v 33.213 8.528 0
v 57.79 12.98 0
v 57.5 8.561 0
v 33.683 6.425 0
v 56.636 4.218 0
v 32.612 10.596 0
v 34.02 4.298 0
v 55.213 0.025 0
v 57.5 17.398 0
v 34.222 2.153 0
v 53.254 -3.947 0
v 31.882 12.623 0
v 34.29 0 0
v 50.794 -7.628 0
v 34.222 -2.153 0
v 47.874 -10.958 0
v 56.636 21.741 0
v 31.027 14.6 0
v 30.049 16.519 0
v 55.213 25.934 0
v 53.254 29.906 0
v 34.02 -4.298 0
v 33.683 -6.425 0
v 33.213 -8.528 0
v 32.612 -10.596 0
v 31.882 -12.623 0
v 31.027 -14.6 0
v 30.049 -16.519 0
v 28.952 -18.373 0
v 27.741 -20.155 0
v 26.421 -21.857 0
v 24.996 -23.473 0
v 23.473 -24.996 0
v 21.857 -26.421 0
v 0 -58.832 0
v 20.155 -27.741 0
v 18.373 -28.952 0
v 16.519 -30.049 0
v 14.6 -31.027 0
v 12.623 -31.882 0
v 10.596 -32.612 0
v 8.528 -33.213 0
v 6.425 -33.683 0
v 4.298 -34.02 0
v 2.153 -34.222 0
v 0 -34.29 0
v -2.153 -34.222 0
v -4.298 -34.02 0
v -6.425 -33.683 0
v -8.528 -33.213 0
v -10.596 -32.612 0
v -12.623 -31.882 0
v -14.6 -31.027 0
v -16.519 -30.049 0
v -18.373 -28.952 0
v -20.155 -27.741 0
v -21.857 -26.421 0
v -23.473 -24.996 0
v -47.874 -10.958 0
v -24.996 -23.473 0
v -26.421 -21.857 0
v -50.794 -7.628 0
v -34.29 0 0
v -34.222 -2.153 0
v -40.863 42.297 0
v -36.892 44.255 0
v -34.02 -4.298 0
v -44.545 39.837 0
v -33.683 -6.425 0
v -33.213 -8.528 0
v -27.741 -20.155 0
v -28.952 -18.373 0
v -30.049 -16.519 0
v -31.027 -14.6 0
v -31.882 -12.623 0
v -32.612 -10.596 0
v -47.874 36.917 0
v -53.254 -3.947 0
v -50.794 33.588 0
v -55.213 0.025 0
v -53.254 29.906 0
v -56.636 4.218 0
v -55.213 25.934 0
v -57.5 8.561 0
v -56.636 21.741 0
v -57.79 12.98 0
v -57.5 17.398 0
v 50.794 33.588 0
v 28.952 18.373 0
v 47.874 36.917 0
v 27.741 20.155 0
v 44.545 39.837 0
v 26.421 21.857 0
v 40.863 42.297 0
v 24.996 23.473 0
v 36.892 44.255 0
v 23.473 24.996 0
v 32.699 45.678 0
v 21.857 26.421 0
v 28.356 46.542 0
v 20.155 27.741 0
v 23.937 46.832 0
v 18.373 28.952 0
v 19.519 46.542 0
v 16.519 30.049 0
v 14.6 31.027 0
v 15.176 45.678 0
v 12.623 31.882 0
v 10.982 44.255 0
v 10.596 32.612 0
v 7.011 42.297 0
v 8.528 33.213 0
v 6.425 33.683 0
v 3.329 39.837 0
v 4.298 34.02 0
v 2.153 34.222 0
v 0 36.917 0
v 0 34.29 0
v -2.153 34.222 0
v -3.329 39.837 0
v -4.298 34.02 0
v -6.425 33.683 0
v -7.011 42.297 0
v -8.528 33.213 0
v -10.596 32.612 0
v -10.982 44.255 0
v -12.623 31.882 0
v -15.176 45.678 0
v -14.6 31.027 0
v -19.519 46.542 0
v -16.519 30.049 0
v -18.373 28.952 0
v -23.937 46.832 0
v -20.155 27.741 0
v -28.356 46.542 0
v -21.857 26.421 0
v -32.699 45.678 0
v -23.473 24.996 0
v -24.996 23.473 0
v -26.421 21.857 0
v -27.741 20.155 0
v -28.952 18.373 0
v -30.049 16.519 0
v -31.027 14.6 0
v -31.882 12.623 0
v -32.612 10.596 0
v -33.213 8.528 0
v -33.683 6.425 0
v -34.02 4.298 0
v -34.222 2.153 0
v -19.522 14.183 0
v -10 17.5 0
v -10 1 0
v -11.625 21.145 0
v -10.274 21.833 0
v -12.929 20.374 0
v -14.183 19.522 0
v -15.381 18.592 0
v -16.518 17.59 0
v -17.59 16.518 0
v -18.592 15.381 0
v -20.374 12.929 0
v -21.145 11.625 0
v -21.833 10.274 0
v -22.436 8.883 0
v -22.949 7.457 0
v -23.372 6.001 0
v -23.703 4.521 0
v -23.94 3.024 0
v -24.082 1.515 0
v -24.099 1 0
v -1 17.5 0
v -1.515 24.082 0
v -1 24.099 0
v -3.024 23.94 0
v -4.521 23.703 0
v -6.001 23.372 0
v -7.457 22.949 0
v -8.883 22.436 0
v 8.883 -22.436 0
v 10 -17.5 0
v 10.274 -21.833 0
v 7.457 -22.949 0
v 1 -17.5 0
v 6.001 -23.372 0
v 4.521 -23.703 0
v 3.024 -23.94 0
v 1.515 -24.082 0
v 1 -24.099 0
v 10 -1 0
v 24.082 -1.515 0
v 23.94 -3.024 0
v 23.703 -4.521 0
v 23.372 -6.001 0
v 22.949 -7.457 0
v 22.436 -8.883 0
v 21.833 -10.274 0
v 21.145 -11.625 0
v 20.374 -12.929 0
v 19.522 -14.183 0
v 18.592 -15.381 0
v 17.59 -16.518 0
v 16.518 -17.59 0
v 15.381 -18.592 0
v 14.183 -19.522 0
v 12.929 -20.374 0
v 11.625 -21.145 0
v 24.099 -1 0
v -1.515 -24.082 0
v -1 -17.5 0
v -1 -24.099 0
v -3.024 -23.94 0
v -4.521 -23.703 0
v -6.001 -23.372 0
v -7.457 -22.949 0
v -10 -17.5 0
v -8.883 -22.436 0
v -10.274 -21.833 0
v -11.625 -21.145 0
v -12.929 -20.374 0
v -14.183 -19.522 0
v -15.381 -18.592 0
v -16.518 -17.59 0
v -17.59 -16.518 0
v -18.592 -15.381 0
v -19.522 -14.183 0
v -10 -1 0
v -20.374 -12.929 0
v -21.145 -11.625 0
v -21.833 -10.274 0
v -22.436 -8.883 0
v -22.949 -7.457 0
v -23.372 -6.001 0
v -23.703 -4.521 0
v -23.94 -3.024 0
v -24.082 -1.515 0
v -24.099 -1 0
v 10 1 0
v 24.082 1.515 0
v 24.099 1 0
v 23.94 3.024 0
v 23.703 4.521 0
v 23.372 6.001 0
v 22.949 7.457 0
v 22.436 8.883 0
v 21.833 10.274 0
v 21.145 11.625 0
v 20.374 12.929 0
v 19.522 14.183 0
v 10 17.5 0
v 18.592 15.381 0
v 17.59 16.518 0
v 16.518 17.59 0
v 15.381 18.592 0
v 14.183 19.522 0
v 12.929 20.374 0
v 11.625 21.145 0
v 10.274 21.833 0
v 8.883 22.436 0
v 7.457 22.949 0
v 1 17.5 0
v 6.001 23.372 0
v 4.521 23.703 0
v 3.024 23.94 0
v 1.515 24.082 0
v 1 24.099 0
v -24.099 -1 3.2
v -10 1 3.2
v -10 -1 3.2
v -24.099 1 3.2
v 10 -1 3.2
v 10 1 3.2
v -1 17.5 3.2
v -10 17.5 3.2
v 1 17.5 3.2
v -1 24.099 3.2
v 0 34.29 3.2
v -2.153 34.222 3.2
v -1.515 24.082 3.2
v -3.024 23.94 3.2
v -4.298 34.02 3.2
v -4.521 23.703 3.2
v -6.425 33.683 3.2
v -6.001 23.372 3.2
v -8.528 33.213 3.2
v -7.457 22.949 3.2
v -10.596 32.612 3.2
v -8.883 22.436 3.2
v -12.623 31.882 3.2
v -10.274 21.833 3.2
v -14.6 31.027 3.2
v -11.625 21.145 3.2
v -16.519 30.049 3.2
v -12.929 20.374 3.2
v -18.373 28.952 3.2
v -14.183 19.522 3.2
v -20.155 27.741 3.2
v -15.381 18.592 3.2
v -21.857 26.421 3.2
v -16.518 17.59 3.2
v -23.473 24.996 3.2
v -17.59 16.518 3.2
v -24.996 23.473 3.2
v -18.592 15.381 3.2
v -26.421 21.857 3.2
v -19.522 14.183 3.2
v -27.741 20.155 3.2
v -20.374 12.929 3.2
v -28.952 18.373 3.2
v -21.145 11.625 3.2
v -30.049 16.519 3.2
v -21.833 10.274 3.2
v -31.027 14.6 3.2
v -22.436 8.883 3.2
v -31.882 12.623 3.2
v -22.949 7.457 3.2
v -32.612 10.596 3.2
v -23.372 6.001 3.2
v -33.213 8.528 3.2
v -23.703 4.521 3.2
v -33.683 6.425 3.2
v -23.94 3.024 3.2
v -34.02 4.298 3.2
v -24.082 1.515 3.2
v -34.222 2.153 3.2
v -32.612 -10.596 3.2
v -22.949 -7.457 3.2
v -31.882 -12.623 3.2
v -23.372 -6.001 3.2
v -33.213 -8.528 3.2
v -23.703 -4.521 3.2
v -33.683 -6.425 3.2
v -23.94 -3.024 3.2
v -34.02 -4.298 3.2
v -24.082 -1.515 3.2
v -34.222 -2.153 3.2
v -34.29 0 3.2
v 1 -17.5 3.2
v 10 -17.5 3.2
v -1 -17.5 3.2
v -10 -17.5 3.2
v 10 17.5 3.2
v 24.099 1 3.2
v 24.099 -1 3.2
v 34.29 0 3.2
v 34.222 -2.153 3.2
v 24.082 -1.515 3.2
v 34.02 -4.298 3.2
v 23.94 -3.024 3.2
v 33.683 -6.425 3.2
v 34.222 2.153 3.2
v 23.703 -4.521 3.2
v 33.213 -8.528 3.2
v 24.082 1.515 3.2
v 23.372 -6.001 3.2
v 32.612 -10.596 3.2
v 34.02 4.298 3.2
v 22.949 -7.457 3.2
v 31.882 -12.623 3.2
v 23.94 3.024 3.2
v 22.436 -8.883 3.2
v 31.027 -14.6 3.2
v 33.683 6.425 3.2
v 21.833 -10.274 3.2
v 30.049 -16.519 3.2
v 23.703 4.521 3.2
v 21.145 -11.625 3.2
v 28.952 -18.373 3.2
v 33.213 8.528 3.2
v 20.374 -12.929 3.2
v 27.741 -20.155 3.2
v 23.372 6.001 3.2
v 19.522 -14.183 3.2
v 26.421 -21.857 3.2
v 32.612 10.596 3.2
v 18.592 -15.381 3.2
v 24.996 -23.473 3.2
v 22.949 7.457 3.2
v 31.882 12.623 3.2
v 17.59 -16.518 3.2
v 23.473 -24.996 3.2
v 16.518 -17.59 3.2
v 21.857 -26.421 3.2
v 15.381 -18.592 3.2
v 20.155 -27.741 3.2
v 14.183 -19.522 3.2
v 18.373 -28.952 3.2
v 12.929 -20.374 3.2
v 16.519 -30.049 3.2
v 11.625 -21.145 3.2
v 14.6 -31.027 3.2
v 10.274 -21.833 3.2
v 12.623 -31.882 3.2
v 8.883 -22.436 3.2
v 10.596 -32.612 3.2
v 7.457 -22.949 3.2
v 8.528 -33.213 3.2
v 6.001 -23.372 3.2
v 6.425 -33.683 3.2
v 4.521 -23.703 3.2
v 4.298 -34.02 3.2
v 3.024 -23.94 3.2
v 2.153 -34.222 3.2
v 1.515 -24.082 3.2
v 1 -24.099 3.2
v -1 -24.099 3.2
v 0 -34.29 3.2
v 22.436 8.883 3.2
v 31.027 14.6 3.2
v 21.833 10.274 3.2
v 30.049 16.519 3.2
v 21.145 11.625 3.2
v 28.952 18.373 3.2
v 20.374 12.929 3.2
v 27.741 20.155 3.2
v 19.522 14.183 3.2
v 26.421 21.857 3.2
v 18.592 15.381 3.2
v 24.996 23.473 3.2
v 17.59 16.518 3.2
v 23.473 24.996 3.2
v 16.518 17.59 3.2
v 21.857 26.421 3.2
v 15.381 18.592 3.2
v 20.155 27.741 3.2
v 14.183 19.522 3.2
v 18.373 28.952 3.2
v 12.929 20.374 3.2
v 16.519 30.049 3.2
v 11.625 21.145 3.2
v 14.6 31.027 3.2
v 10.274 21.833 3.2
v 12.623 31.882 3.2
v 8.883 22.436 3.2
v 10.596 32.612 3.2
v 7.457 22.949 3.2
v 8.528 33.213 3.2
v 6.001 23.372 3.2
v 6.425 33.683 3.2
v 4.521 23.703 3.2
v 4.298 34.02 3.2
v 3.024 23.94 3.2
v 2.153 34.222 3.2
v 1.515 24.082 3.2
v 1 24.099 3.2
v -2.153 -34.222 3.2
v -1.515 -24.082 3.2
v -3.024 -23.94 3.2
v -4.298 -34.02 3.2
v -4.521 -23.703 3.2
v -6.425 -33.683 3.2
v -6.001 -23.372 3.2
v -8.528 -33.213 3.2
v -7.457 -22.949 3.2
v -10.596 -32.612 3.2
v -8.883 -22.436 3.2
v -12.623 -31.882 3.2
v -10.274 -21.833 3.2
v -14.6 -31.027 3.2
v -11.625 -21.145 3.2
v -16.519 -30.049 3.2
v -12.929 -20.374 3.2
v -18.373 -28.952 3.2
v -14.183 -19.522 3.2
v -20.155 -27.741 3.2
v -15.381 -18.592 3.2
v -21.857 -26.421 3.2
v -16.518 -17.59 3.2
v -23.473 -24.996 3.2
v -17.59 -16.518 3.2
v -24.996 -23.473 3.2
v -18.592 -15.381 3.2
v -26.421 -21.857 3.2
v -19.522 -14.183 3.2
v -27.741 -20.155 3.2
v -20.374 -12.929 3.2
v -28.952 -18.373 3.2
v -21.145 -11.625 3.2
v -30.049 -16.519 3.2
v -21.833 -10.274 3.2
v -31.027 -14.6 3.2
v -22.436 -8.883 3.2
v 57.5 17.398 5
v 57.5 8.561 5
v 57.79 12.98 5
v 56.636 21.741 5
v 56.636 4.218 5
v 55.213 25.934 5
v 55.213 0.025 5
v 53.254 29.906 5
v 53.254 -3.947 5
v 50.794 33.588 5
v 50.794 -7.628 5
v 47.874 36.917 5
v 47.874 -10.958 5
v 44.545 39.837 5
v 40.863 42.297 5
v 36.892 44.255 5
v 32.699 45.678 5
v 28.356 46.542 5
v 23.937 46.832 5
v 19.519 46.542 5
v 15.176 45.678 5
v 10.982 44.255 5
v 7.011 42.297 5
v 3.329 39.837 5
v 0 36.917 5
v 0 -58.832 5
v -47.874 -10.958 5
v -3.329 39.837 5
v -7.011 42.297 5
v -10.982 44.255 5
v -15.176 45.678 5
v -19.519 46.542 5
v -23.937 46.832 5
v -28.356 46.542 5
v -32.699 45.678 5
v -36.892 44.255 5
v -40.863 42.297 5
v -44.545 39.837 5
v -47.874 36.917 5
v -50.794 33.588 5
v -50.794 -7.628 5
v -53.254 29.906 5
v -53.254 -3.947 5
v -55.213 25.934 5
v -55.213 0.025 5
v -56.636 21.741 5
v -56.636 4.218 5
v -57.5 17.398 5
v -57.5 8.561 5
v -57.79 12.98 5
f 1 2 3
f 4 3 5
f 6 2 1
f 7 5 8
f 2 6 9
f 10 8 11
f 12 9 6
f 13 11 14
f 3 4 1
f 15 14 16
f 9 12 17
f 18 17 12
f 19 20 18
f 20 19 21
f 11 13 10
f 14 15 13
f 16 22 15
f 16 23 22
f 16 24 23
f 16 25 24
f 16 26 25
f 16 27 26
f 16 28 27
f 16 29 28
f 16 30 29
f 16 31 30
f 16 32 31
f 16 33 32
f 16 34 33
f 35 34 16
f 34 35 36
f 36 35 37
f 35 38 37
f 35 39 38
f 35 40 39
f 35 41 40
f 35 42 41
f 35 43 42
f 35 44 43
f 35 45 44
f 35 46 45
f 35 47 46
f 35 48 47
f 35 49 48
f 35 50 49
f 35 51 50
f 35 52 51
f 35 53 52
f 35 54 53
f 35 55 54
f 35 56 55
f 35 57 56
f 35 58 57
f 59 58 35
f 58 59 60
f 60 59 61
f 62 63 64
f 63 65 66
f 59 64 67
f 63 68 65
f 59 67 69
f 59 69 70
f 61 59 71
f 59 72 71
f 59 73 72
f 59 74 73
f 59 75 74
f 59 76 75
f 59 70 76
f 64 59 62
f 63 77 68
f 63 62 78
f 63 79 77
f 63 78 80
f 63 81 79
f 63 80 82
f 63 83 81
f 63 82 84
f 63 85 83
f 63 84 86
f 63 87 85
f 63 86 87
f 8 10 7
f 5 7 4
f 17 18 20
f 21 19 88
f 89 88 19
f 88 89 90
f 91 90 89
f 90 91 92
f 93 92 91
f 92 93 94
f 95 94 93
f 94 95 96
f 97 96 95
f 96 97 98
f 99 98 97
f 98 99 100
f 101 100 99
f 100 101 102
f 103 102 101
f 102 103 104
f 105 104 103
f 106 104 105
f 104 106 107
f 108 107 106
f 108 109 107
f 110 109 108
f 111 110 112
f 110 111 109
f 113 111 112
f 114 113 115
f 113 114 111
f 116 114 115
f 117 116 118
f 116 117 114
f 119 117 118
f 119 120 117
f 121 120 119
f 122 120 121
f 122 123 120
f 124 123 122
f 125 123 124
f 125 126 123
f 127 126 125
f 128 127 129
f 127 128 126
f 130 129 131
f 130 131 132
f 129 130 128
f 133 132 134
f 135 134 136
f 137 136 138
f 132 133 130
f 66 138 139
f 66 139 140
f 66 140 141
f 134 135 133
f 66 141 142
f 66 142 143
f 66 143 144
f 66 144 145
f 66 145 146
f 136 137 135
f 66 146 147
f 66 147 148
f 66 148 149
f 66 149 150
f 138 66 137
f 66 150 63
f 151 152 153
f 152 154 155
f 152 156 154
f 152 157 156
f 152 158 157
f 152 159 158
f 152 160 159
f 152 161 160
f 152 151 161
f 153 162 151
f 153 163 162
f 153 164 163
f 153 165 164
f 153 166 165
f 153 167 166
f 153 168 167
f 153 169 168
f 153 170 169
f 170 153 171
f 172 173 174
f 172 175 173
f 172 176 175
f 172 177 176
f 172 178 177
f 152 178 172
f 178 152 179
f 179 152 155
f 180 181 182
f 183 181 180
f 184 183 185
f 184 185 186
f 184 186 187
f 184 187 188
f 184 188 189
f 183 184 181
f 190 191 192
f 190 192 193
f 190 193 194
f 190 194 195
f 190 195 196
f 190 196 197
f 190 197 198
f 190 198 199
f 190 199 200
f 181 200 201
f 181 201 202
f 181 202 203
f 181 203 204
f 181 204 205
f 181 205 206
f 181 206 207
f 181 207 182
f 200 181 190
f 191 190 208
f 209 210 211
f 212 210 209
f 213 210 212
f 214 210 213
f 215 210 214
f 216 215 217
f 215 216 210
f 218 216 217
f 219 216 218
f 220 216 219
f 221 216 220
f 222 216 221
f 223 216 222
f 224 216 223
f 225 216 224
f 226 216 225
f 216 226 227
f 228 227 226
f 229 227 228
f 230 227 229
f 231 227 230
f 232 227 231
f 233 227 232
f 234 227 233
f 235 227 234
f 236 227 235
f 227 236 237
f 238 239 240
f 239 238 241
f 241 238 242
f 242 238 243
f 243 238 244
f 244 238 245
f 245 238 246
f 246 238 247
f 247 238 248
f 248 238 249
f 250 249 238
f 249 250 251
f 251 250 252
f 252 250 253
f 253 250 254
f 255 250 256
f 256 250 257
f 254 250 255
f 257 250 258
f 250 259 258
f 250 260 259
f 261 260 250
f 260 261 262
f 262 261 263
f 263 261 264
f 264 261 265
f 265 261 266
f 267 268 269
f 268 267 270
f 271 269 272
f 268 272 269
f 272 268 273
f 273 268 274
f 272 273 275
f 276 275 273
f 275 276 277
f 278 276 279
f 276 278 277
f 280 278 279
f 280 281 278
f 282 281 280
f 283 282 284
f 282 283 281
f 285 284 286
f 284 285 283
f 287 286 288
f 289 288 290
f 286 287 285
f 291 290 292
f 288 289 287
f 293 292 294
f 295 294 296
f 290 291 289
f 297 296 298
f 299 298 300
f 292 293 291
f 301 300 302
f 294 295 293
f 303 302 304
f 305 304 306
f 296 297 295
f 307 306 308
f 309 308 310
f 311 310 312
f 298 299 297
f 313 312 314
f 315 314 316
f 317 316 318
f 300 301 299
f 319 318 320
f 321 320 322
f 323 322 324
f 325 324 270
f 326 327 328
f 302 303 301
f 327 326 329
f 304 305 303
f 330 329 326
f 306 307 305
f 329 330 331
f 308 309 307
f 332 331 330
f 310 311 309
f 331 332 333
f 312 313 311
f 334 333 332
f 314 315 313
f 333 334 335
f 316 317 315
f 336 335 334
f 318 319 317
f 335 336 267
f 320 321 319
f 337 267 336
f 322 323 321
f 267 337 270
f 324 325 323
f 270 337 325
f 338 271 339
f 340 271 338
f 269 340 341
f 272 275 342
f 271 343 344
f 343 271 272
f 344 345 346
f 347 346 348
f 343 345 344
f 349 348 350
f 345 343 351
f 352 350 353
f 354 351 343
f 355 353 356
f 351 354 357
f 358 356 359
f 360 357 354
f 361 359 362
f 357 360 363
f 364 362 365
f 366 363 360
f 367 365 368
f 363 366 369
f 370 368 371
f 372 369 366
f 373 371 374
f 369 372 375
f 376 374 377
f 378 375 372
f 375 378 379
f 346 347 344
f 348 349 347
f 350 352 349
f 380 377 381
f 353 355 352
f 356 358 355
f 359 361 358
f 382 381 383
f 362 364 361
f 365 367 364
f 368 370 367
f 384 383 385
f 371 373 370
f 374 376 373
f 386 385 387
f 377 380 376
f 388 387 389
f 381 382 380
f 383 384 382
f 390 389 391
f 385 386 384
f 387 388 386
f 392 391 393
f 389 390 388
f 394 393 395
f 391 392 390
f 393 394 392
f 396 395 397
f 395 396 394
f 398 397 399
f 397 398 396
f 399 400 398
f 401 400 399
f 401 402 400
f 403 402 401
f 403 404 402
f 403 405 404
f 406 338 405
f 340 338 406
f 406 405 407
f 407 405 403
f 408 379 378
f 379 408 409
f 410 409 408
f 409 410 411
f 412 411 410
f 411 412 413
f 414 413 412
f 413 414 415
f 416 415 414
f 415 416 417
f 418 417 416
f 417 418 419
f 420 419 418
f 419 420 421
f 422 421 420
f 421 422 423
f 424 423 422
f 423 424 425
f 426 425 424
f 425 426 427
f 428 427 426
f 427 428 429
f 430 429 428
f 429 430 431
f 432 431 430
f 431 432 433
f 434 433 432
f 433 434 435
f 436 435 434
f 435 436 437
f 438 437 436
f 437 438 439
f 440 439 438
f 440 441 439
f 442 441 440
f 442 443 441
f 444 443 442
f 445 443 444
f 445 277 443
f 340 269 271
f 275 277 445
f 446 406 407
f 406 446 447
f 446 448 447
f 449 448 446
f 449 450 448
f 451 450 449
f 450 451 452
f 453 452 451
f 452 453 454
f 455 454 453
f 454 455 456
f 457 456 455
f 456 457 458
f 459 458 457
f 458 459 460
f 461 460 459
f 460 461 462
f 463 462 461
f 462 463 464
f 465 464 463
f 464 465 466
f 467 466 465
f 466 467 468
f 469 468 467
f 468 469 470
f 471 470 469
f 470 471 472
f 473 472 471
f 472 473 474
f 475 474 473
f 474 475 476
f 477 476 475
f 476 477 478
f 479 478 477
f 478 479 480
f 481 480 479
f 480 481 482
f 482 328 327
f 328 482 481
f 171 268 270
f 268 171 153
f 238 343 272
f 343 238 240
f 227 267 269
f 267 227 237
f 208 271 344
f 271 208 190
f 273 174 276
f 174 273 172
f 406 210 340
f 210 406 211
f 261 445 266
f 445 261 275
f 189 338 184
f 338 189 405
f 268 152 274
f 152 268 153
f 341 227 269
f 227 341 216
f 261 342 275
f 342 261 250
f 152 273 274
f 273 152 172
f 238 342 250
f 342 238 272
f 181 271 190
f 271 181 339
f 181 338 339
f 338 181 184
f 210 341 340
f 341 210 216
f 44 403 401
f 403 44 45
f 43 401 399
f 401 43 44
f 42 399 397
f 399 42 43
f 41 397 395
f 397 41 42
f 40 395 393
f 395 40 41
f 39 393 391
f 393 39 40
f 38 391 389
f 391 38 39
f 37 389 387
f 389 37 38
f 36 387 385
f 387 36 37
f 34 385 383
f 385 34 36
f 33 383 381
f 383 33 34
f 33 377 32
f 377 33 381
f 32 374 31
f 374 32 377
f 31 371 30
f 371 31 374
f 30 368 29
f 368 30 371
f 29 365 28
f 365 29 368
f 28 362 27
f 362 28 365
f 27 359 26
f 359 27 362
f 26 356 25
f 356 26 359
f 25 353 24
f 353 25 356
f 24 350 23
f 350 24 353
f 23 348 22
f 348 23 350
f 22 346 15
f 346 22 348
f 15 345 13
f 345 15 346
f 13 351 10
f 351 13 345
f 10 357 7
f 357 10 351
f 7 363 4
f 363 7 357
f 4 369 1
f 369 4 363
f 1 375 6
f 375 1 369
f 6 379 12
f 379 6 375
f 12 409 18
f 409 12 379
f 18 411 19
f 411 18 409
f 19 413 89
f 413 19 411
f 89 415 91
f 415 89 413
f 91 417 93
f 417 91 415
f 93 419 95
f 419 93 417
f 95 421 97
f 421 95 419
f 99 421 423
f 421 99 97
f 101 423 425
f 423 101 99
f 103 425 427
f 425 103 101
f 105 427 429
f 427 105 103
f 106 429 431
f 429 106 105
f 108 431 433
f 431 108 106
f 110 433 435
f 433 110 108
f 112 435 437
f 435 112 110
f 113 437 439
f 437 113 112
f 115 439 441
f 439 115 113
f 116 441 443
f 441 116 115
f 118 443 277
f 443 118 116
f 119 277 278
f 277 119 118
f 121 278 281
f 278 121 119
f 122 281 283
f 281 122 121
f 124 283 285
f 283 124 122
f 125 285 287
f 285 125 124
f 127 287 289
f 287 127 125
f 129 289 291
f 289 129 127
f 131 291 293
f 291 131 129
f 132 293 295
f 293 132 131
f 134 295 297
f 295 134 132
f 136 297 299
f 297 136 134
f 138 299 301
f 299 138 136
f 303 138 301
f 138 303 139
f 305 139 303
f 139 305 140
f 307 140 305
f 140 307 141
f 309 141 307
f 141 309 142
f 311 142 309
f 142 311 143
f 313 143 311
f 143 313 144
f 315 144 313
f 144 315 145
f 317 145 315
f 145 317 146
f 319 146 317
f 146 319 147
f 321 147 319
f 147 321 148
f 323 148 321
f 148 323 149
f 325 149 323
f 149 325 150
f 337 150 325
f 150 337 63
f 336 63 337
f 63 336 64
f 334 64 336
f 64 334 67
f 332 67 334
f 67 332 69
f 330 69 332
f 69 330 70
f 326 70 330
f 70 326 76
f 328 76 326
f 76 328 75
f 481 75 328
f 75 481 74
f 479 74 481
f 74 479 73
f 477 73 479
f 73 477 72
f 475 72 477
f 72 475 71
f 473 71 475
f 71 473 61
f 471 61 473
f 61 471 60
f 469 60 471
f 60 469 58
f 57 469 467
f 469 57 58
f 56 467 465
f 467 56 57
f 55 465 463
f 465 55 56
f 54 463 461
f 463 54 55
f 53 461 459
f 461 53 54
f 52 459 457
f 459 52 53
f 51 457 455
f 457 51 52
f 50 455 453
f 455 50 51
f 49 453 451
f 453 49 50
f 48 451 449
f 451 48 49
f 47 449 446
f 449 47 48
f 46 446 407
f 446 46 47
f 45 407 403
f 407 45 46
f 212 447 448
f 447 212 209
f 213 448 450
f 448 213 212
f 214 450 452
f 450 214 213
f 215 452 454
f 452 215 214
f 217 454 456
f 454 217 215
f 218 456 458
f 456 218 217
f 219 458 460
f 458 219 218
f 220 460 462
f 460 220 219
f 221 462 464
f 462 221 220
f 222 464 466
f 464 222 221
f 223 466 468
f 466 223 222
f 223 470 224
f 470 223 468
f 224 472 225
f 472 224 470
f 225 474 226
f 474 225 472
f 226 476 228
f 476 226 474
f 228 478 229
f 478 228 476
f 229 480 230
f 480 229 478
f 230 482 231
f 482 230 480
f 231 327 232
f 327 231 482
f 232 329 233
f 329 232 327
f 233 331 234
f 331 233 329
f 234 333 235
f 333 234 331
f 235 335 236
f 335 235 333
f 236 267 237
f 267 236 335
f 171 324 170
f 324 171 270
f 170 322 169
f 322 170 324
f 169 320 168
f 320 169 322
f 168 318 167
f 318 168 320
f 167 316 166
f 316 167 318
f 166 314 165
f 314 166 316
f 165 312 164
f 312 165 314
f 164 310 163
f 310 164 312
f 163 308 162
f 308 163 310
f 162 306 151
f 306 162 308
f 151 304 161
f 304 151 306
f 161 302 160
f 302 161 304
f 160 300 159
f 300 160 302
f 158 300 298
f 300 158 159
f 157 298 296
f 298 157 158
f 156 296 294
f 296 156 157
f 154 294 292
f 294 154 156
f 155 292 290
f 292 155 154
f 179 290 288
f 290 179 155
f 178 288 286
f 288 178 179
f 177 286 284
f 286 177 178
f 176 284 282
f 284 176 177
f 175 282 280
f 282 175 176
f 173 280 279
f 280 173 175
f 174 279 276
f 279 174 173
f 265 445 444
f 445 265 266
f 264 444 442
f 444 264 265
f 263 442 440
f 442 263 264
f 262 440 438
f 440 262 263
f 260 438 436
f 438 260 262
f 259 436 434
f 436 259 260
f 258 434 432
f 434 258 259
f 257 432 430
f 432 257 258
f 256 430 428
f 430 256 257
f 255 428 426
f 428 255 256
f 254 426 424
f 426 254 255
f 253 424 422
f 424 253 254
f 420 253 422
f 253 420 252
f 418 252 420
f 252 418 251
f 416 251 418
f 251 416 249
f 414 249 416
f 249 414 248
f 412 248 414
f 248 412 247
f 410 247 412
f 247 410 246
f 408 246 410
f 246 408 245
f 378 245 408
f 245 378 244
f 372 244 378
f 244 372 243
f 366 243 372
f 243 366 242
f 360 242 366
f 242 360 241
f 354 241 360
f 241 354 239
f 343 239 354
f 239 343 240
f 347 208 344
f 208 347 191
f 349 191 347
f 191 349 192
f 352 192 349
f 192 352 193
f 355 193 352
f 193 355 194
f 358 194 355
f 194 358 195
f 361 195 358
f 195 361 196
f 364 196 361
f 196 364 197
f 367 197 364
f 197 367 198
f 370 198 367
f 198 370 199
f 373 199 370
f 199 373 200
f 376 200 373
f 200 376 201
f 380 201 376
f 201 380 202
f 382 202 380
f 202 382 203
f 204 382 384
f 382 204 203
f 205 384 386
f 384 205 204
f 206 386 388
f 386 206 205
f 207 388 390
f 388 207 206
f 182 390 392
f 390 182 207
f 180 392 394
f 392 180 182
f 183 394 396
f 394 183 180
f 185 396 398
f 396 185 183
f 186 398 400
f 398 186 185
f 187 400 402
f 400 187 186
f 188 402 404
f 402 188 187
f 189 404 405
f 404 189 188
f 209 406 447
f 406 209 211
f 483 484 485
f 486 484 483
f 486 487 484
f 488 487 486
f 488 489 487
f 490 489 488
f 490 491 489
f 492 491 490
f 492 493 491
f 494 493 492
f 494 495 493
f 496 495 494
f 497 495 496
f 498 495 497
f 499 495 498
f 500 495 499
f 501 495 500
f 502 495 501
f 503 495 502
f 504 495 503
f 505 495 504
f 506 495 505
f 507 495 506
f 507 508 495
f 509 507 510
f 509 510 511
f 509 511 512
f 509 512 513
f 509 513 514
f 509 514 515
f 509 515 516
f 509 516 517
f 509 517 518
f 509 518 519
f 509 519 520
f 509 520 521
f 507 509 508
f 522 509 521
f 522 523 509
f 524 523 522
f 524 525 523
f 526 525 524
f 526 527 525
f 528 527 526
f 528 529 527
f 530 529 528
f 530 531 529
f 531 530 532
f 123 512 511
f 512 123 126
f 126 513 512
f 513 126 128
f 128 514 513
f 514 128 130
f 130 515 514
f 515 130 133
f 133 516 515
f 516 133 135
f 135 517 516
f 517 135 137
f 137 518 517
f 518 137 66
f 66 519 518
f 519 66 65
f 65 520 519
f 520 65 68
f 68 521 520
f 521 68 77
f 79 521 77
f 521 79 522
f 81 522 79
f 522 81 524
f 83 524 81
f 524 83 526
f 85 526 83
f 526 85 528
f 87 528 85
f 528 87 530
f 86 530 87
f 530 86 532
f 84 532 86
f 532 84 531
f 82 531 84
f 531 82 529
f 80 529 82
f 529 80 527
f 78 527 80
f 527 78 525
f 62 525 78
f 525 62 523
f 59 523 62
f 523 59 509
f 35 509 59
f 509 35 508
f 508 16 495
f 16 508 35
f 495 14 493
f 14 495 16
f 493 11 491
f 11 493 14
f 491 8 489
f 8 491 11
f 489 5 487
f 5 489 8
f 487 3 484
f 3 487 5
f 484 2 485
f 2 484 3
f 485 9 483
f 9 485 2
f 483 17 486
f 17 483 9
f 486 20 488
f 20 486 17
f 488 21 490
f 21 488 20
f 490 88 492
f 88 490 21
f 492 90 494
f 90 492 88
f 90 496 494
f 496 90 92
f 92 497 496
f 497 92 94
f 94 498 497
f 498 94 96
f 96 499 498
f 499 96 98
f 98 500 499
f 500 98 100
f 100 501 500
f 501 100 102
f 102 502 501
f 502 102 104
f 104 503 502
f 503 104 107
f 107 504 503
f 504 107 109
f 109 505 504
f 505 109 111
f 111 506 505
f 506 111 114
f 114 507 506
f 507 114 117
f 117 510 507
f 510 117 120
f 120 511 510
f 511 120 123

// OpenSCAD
$fn=100;

height = 2.6*25.4*1.6;

difference() {
    translate([0, -6, 0])
    linear_extrude(5)
        heart(height / (3 * sin(45) + 1), true);
    union() {
        translate([-(2.2*25.4)/2, -1, 0]) linear_extrude(3.2) square([2.2*25.4, 2]);
        translate([-1, -(2.2*25.4)/2, 0]) linear_extrude(3.2) square([2, 2.2*25.4]);
        translate([-10,-17.5,0]) linear_extrude(3.2) square([20, 35]);
        linear_extrude(3.2) difference() {
            circle(d=2.7*25.4);
            circle(d=1.9*25.4);
        }
    }
}




module heart_sub_component(radius) {
    rotated_angle = 45;
    diameter = radius * 2;
    $fn = 48;

    translate([-radius * cos(rotated_angle), 0, 0]) 
        rotate(-rotated_angle) union() {
            circle(radius);
            translate([0, -radius, 0]) 
                square(diameter);
        }
}

module heart(radius, center = false) {
    offsetX = center ? 0 : radius + radius * cos(45);
    offsetY = center ? 1.5 * radius * sin(45) - 0.5 * radius : 3 * radius * sin(45);

    translate([offsetX, offsetY, 0]) union() {
        heart_sub_component(radius);
        mirror([1, 0, 0]) heart_sub_component(radius);
    }

}
